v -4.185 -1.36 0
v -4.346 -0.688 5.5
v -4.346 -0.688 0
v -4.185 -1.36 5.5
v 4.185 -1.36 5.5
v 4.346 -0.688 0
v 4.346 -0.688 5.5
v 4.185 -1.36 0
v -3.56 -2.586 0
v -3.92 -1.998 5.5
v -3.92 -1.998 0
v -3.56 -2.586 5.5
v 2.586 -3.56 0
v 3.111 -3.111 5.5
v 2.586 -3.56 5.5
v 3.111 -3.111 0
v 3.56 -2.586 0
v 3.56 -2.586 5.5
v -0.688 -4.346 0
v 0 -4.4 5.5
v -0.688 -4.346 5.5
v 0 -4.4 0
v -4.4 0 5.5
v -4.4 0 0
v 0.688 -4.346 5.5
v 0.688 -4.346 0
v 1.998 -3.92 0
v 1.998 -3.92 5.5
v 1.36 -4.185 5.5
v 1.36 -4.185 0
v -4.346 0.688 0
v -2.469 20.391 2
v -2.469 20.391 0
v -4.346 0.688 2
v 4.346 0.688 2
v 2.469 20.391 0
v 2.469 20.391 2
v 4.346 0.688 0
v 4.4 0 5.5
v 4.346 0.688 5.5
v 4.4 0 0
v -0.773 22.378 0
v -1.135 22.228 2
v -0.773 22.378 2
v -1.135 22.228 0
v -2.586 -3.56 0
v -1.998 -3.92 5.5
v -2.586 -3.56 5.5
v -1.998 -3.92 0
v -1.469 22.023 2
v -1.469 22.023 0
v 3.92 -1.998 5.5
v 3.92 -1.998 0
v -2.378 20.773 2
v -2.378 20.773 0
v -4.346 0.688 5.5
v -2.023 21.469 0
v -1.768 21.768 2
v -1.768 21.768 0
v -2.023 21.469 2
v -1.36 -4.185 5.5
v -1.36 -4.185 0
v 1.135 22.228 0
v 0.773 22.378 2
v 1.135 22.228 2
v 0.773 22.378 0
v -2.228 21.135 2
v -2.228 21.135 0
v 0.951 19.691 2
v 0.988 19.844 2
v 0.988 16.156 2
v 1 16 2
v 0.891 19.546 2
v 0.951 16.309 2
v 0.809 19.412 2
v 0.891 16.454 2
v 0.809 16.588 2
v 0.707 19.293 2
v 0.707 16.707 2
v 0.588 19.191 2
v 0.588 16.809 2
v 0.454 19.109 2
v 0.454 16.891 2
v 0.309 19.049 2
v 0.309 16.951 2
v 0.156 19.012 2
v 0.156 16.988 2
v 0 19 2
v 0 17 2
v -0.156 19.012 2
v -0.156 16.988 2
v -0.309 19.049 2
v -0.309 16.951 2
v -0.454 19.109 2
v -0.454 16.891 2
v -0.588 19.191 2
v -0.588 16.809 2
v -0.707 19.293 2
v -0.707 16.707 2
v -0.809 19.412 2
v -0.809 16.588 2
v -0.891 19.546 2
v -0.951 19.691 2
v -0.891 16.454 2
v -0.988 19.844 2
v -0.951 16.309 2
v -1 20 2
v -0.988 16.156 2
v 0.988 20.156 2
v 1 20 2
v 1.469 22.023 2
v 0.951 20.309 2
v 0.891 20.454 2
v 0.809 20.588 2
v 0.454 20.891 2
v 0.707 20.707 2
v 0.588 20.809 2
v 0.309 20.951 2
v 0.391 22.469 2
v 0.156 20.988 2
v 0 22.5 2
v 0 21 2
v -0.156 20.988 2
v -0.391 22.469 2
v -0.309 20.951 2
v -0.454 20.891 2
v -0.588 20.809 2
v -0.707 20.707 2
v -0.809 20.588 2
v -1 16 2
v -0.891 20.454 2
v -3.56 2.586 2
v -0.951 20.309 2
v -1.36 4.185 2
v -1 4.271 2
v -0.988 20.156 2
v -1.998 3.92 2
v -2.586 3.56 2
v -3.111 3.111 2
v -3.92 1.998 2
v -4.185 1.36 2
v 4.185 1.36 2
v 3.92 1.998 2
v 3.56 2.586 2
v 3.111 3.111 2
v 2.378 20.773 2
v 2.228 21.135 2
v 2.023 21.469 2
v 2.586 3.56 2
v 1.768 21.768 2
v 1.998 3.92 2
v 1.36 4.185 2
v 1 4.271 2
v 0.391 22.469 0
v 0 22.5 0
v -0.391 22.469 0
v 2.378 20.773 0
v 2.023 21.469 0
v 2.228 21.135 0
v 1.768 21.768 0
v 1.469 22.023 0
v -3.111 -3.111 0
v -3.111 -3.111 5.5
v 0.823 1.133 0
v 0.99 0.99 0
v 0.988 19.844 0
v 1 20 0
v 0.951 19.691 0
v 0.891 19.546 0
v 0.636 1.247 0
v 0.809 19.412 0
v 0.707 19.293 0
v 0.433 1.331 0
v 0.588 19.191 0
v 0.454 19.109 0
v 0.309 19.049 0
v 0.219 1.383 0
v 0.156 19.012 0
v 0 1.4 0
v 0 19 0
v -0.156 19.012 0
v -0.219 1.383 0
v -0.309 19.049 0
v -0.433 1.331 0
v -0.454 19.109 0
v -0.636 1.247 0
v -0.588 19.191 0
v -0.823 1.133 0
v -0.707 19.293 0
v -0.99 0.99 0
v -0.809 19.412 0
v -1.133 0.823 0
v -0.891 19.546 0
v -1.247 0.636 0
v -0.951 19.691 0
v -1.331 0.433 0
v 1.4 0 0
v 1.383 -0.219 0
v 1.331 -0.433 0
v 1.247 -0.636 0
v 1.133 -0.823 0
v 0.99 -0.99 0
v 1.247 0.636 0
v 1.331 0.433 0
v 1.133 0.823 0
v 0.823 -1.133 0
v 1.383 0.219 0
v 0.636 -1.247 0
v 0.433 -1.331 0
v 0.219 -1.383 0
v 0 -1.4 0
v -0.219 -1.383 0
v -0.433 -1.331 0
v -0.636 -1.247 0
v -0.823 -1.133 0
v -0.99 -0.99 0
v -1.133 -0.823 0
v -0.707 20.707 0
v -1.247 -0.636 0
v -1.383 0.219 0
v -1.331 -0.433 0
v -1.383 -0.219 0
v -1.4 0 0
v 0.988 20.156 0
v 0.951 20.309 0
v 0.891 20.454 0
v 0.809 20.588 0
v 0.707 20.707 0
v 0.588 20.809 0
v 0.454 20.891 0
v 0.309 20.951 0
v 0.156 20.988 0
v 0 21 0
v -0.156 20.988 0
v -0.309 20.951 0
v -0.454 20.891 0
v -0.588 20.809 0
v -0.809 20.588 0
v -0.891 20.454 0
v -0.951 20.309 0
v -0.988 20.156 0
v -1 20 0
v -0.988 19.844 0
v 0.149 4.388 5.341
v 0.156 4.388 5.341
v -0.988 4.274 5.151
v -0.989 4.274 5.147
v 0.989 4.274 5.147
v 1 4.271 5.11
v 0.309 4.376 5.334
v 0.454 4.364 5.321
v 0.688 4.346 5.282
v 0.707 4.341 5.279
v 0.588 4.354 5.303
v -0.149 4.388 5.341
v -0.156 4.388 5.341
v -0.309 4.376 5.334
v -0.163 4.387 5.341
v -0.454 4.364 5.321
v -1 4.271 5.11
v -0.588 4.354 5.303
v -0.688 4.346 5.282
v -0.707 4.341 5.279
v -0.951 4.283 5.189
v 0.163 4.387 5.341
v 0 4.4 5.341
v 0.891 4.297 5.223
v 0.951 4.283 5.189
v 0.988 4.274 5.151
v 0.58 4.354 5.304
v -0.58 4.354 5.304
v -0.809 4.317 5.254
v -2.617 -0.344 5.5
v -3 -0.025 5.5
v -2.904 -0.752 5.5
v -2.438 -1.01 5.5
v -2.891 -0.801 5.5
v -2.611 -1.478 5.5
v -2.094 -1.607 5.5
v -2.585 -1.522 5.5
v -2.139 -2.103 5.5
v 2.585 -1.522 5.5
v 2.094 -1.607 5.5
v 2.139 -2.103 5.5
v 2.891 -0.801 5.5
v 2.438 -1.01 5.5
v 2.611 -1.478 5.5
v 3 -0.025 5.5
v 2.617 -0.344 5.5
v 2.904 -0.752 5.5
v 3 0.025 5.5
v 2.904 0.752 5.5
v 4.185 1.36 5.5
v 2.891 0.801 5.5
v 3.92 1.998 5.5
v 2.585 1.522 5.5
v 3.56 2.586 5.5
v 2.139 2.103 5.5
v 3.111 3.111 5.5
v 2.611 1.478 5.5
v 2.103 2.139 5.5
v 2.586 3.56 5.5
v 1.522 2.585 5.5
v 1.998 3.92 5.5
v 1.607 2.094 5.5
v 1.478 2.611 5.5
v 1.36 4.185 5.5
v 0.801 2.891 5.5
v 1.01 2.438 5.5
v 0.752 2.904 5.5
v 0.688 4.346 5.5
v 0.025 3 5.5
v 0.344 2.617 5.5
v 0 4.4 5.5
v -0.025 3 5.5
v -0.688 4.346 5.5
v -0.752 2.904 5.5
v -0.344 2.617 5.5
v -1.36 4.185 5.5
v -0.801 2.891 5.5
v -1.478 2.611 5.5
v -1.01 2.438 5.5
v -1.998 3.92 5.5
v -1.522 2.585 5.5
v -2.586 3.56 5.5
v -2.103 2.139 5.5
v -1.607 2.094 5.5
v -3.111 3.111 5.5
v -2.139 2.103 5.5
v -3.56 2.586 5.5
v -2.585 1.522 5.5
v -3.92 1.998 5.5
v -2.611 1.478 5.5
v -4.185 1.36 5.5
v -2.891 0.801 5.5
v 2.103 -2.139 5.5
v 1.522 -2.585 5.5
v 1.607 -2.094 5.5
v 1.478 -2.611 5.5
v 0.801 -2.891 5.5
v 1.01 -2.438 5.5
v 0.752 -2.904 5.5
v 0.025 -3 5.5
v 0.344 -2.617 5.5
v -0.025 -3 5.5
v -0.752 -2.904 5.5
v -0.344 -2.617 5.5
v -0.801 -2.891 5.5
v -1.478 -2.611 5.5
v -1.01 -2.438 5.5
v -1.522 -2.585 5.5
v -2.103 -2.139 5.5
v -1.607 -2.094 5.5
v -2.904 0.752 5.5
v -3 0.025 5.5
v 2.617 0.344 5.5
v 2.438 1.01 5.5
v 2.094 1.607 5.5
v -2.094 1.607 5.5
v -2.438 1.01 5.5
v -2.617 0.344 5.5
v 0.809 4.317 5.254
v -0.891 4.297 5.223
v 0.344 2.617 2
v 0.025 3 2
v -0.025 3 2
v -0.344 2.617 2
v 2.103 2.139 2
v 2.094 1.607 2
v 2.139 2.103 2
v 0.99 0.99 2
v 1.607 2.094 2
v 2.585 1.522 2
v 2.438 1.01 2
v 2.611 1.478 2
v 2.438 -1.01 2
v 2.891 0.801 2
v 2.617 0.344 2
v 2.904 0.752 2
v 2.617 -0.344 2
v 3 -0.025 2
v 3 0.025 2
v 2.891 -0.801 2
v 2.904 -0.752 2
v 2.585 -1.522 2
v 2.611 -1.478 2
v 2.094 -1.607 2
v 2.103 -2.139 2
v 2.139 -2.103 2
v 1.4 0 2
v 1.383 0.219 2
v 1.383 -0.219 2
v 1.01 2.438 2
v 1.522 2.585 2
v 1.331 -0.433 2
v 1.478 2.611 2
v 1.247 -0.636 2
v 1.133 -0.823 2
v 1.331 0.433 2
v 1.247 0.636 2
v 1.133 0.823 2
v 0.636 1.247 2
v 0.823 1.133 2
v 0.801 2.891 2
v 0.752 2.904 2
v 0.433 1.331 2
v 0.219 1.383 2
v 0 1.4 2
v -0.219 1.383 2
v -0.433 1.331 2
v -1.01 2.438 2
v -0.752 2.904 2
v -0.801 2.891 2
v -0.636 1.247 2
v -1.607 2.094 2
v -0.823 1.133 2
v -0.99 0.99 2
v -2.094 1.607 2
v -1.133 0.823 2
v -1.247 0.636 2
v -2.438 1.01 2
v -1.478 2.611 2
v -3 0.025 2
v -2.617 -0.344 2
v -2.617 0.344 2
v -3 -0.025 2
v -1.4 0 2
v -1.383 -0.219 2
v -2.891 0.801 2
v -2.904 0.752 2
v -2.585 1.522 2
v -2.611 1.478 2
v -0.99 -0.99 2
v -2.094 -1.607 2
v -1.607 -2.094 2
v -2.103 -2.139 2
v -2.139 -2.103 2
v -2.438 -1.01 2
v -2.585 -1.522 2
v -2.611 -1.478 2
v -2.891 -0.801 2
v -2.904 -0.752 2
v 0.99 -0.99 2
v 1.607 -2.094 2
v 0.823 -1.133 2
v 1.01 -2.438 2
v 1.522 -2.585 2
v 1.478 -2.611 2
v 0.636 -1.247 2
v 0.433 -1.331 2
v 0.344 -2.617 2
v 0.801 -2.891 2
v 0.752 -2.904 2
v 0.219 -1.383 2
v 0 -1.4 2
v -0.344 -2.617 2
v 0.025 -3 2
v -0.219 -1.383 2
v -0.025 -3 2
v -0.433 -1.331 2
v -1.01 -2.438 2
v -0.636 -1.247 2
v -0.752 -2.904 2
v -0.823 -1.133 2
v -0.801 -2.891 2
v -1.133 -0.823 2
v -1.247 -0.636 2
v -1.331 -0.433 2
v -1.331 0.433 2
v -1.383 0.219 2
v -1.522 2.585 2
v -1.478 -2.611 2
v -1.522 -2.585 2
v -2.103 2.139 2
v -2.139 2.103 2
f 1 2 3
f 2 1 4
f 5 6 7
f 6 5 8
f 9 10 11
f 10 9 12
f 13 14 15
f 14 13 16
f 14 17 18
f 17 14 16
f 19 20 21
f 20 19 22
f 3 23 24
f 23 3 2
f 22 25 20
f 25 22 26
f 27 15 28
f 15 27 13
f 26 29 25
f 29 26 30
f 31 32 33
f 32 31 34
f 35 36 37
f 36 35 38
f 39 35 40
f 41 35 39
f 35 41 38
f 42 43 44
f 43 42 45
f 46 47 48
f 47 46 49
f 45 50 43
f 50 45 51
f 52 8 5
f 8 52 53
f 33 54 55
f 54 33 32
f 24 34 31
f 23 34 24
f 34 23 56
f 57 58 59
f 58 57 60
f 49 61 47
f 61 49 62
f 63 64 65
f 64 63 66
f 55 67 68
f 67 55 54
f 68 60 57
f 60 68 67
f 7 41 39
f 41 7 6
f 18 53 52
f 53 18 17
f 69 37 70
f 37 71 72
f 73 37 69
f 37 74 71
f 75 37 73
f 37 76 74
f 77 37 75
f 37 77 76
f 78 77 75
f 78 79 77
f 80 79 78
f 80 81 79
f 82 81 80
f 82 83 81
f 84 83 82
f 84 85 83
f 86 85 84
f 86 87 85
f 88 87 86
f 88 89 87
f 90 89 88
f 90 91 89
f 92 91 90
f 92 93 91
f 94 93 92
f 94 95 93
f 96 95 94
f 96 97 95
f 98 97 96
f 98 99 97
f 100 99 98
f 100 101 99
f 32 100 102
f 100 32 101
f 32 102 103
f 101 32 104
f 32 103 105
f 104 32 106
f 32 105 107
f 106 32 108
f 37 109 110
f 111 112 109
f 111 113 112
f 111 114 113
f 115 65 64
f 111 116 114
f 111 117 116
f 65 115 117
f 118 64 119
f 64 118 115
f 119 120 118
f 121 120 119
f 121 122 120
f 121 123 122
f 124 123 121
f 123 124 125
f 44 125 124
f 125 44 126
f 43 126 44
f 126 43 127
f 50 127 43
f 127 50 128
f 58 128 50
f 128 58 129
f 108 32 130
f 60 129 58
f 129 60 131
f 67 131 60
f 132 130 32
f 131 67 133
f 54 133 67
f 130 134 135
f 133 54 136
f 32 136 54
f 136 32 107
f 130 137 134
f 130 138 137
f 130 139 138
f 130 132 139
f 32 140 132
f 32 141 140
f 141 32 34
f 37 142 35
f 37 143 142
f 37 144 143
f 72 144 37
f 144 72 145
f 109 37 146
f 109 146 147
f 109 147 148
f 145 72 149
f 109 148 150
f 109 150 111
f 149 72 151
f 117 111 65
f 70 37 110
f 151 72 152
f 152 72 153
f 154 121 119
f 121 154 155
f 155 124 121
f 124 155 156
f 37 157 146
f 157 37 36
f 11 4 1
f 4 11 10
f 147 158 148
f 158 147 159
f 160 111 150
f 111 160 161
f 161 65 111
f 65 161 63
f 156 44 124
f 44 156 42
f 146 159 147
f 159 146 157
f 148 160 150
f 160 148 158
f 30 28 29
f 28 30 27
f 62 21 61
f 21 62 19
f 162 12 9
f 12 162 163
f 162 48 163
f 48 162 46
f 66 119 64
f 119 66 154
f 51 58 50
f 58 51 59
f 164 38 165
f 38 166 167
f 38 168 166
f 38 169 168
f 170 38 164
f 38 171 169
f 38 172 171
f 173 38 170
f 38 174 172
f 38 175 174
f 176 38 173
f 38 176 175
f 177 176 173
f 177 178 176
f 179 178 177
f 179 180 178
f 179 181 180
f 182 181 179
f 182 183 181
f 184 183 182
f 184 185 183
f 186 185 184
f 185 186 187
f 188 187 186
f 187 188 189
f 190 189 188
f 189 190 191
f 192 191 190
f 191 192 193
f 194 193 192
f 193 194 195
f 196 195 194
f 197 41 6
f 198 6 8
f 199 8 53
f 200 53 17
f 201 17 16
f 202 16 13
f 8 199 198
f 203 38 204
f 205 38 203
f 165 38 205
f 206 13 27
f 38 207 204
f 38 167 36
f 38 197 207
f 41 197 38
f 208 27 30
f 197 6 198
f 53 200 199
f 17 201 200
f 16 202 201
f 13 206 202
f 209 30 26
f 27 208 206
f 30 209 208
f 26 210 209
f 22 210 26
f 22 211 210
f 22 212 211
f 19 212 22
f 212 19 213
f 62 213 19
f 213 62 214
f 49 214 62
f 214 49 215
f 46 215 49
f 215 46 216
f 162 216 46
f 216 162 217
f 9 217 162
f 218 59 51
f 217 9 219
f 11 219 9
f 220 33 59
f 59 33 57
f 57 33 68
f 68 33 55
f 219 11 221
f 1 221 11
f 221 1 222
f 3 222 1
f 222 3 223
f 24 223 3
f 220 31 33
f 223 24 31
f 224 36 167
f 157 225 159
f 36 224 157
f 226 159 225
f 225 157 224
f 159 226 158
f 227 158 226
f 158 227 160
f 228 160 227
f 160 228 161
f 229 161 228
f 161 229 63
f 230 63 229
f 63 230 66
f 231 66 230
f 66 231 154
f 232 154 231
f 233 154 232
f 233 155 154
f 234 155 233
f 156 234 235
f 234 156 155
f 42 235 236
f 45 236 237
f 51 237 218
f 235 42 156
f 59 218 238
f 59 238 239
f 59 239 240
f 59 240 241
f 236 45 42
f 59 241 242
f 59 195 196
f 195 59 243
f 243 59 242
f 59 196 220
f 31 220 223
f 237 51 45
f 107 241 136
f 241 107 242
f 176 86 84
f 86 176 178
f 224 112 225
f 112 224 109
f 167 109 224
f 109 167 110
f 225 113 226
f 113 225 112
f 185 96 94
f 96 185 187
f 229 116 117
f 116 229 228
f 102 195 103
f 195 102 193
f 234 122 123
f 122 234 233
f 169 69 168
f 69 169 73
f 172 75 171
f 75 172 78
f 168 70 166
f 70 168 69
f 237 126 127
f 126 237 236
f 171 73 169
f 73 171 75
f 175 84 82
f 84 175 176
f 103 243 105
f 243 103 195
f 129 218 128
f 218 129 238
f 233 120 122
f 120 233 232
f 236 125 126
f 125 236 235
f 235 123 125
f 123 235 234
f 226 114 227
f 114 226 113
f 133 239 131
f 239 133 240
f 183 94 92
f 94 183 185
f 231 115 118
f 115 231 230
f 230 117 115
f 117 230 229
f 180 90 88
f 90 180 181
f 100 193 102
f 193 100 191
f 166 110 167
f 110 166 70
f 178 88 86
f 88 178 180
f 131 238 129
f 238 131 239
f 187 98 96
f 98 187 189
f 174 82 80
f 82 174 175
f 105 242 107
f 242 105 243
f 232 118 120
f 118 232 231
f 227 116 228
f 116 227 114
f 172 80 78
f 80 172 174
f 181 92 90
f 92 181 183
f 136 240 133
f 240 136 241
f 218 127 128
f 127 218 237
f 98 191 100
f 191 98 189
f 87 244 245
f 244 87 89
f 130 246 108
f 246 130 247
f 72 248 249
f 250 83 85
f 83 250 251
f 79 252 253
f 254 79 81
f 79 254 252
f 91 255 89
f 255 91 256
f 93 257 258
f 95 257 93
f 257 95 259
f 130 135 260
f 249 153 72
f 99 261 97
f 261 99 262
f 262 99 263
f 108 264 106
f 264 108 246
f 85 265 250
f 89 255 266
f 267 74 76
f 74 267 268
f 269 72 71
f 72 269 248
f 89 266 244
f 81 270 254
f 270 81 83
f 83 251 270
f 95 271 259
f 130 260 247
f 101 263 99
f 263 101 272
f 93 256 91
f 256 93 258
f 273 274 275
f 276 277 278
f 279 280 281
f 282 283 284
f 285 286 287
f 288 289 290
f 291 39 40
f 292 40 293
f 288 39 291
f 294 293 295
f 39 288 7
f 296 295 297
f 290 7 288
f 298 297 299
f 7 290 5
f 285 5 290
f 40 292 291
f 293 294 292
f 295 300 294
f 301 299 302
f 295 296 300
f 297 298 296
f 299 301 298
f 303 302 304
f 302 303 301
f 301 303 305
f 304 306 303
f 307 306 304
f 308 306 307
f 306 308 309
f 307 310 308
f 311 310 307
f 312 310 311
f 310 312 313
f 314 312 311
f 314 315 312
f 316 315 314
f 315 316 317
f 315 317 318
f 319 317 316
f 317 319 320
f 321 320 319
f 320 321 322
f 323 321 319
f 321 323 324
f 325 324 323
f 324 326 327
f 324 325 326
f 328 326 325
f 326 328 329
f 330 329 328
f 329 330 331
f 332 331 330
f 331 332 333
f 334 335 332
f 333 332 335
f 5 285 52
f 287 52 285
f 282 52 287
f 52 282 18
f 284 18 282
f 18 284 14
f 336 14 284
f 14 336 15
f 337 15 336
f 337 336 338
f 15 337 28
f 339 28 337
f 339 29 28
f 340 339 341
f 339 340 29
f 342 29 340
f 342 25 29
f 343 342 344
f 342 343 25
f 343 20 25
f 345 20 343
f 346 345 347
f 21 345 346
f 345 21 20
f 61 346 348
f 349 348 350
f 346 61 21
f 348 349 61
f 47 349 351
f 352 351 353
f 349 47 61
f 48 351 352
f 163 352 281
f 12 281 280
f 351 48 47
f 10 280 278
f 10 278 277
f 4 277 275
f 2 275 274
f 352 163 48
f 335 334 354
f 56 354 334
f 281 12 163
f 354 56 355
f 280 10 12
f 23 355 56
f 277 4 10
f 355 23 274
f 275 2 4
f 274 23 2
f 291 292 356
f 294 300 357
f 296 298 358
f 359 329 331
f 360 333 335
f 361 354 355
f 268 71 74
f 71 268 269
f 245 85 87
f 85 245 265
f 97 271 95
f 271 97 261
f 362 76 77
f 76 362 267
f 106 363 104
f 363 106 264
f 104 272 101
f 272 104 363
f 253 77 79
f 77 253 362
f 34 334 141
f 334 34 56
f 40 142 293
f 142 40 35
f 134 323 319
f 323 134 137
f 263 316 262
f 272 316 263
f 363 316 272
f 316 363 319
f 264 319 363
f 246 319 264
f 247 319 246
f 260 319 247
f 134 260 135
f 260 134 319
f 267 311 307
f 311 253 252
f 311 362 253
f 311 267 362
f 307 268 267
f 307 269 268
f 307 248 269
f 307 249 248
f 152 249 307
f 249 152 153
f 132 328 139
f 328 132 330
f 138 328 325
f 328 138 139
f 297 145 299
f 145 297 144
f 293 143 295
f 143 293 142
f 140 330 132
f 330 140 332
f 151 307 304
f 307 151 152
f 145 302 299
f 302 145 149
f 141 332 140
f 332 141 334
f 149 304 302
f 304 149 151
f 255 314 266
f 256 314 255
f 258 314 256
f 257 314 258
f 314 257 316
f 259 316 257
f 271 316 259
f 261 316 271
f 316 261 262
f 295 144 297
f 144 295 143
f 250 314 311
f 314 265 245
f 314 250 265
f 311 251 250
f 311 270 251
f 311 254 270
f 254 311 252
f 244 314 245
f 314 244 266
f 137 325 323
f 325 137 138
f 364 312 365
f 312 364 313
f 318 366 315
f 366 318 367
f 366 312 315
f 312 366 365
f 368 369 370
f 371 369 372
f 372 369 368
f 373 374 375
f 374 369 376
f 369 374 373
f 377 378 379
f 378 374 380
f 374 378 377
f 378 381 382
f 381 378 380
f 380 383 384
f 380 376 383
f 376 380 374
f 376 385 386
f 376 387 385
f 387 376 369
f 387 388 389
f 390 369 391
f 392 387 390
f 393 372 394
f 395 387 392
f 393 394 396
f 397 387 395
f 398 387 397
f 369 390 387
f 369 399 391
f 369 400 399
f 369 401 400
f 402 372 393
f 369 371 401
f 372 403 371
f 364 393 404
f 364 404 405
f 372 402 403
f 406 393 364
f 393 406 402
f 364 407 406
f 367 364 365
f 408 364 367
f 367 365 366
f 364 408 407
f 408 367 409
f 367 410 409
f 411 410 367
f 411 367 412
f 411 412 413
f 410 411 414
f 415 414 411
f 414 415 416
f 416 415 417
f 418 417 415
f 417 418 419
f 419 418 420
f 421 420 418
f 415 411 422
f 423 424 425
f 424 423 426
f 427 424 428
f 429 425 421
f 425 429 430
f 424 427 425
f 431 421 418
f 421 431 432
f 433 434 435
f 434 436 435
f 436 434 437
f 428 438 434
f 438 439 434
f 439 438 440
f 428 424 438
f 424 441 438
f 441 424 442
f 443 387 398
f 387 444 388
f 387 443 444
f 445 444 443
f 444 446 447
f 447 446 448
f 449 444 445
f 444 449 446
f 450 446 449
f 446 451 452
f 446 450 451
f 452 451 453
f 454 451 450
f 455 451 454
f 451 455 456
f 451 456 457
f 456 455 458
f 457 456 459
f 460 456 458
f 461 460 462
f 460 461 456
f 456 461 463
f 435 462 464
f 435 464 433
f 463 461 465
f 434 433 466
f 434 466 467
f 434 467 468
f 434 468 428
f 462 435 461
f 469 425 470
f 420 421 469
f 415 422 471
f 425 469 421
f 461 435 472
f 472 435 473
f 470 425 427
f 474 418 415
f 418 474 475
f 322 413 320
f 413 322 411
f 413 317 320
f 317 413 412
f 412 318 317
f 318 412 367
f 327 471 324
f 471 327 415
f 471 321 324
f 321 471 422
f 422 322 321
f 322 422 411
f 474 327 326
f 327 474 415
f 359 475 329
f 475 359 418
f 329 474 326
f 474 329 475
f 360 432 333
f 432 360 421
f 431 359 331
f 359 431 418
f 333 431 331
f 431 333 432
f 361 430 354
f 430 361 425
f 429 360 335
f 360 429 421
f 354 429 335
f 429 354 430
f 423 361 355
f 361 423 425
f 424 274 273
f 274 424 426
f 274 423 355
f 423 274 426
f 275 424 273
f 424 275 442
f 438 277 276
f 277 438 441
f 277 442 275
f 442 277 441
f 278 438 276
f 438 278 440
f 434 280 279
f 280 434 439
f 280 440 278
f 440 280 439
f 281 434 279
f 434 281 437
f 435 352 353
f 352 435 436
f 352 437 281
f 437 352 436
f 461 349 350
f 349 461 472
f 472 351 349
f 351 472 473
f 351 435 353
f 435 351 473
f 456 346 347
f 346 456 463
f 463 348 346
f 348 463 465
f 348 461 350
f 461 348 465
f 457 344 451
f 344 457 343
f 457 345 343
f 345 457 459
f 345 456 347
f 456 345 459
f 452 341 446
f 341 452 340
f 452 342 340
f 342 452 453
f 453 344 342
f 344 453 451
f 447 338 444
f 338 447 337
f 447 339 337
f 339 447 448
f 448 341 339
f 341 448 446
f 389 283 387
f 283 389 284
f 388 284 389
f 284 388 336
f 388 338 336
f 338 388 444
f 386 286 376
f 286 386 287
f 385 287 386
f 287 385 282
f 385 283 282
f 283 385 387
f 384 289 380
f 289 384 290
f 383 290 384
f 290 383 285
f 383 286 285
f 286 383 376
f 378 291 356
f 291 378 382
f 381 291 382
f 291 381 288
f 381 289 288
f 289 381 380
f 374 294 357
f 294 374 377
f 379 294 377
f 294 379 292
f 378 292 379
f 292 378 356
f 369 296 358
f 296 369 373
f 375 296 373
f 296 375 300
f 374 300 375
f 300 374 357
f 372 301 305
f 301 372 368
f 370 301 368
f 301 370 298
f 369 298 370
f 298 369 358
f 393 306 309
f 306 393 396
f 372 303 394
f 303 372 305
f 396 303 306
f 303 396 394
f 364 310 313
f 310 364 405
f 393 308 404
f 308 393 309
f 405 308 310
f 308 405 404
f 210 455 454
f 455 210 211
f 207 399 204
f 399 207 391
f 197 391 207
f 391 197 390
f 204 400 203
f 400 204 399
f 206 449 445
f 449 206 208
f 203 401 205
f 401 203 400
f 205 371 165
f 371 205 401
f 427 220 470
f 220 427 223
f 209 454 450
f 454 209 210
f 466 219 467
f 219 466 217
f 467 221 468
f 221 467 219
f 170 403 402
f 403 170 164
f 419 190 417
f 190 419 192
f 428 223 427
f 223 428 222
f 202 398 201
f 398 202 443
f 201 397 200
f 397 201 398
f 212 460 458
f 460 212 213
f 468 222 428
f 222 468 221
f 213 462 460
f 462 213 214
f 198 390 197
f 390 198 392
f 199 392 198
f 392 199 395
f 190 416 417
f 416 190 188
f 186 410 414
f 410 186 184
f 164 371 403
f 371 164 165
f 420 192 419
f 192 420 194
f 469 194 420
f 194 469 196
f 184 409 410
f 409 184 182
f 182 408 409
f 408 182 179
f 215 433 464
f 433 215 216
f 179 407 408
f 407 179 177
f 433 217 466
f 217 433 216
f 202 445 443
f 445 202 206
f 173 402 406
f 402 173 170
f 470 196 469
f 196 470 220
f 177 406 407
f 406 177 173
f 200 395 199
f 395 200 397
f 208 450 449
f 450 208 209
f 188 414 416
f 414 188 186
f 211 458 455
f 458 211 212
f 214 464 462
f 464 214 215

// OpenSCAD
/**
    Parametric servo arm generator for OpenScad

    Forked from 2012 Charles Rincheval.  All rights reserved.

    This library is free software; you can redistribute it and/or
    modify it under the terms of the GNU Lesser General Public
    License as published by the Free Software Foundation; either
    version 2.1 of the License, or (at your option) any later version.

    This library is distributed in the hope that it will be useful,
    but WITHOUT ANY WARRANTY; without even the implied warranty of
    MERCHANTABILITY or FITNESS FOR A PARTICULAR PURPOSE.  See the GNU
    Lesser General Public License for more details.

    You should have received a copy of the GNU Lesser General Public
    License along with this library; if not, write to the Free Software
    Foundation, Inc., 51 Franklin St, Fifth Floor, Boston, MA  02110-1301  USA

*/

// Which Spline would you like to see?
// spline_type = 1; // [1:"Hitec C1-24T",2:"Hitec D1-15T",3:"Futaba 1F-15",4:"Futaba 2F-21T (9g?)",5:"Futaba 3F-25T]";
// Spline Size
spline_type = 1; // [1:Hitec C1-24T, 2:Hitec D1-15T, 3:Futaba 1F-15, 4:Futaba 2F-21T (9g?), 5:Futaba 3F-25T, 6:Actobotics Horn(Hitec), 7:Actobotics Horn(Futaba), 8:Tetrix Horn(Hitec), 9:Tetrix Horn(Futaba) ]

arm_length = 20;

arm_count = 1; // [1,2,3,4,5,6,7,8]

arm_screw_diameter = 2.0;

base_thickness = 2.0;

/**
    Clear between arm head and servo head
    With PLA material, use clear : 0.3, for ABS, use 0.2
*/
SERVO_HEAD_CLEARANCE = 0.2;


$fn = 40/1;


/**
    Head / Tooth parameters
    http://https://www.servocity.com/servo-spline-info

    First array (head related) :
    0. Head external diameter  (INTERNAL OF TEETH)
    1. Head height
    2. Head thickness
    3. Head screw diameter
    4. Head Base Thickness

    Second array (tooth related) :
    0. Tooth count
    1. Tooth height
    2. Tooth length
    3. Tooth width
*/
/**
   Tooth (ON SERVO)

     |<-w->|
     |_____|___
     /     \  ^h
   _/       \_v
    |<--l-->|

   - tooth height (h)
   - tooth length (l)
   - tooth width (w)

    For a new servo: Seems to work best to first set the tooth height to zero,
     and get the outer diameter snug, then work on the teeth.

   Printed very well on Printrbot Simple Pro  0.3mm nozzle, 0.1 layer PLA

   If you need just the spline, set the arm length, and head base thickness to zero

*/
//------------------------------------------------

HITEC_D1_SPLINE = [
                    [7.6, 5.5, 1.8, 3.4, base_thickness],
                    [15, 0.7, 1.3, 0.2]
                  ];
module servo_hitec_d1(length, count) {
  servo_arm(HITEC_D1_SPLINE, [length, count]);
}
//------------------------------------------------

HITEC_C1_SPLINE = [
                    [5.6, 3.5, 1.6, 2.8, base_thickness],
                    [24, 0.4, 0.7, 0.051]
                  ];
module servo_hitec_c1(length, count) {
  servo_arm(HITEC_C1_SPLINE, [length, count]);
}
//------------------------------------------------

FUTABA_1F_SPLINE = [
                     [4.0, 3.75, 1.1, 2.3, base_thickness],
                     [15, 0.25, 0.6, 0.09]
                   ];
module servo_futaba_1f(length, count) {
    servo_arm(FUTABA_1F_SPLINE, [length, count]);
}
//------------------------------------------------

FUTABA_2F_SPLINE = [
                     [4.90, 3, 1.8, 2.3, base_thickness],
                     [21, 0.57, 0.7, 0.1]
                   ];
module servo_futaba_2f(length, count) {
  servo_arm(FUTABA_2F_SPLINE, [length, count]);
}
//------------------------------------------------

FUTABA_3F_SPLINE = [
                     [5.92, 3, 1.1, 2.5, base_thickness],
                     [25, 0.3, 0.7, 0.1]
                   ];
module servo_futaba_3f(length, count) {
  servo_arm(FUTABA_3F_SPLINE, [length, count]);
}
//------------------------------------------------

/**
    If you want to support a new servo, juste add a new spline definition array
    and a module named like servo_XXX_YYY where XXX is servo brand and YYY is the
    connection type (3f) or the servo type (s3003)
*/

//    Servo head

module servo_head(params, clear = SERVO_HEAD_CLEARANCE) {

  head = params[0];
  tooth = params[1];

  head_diameter = head[0];
  head_height = head[1];
  head_base = head[4];

  tooth_count = tooth[0];
  tooth_height = tooth[1];
  tooth_length = tooth[2];
  tooth_width = tooth[3];

  //     %cylinder(r = (head_diameter / 2), h = head_height + 1);

  cylinder(r = head_diameter / 2 - tooth_height + 0.03 + clear, h = head_height);

// add teeth
    for (i = [0 : tooth_count]) {
      rotate([0, 0, i * (360 / tooth_count)]) {
        translate([0, head_diameter / 2 - tooth_height + clear, 0]) {
          servo_head_tooth(tooth_length, tooth_width, tooth_height, head_height);
        }
      }
    }
  }


module servo_head_tooth(length, width, height, head_height){

  curvatureAdd = 0.05;
  linear_extrude(height = head_height) {
    polygon([[-length / 2 - curvatureAdd, -curvatureAdd], [-width / 2, height], [width / 2, height], [length / 2 + curvatureAdd, -curvatureAdd]]);  
   }
}
/**
    Servo hold
    - Head / Tooth parameters
    - Arms params (length and count)
*/
module servo_arm(params, arms) {

  head = params[0];
  tooth = params[1];

  head_diameter = head[0];
  head_height = head[1];
  head_thickness = head[2];
  head_screw_diameter = head[3];
  head_base = head[4];

  tooth_length = tooth[2];
  tooth_width = tooth[3];

  arm_length = arms[0];
  arm_count = arms[1];

  /**
      Servo arm
      - length is from center to last hole
  */
  module arm(tooth_length, tooth_width, head_height, hole_count ) {

//    arm_screw_diameter = 2;

    difference() {
      union() {
        hull() {
          cylinder(r = tooth_width / 2, h = head_base);
          translate([0, tooth_length, 0]) {
          cylinder(r = arm_screw_diameter / 2 + 1.5, h = head_base);
//          #cylinder(r = tooth_width / 3, h = head_base);
              
          } 
        }

      }

      // Hole
//      for (i = [0 : hole_count - 1]) {
        //translate([0, length - (length / hole_count * i), -1]) {
        translate([0, tooth_length , -1]) {
          cylinder(r = arm_screw_diameter / 2, h = 10);
        }
//      }

      translate([0, 0, -0.001])cylinder(r = head_screw_diameter / 2, h = 10);
    }



  }

  arm_thickness = head_thickness;

  // Arm
  difference() {   // spline hub
    union(){
      for (j = [0 : arm_count - 1]) {
        rotate([0, 0, j * (360 / arm_count)]) {
          arm(arm_length, head_diameter + arm_thickness * 2, head_height, 1);
            hull() {                  // cross support
              translate([0 , head_diameter/2, 0])
              cylinder(r = head_base / 2, h = head_base + head_height);
              translate([0 , max(arm_length - 4,0), 0])
              cylinder(r = head_base / 2, h = head_base);
            } 
         }
       }
        
       cylinder(r = head_diameter / 2 + head_thickness, h = head_height + head_base );
     }
    
     translate([0, 0, -0.001]) 
     cylinder(r = head_screw_diameter / 2, h = 10);  // hole
     translate([0, 0, head_base + 0.0001])
     servo_head(params); // teeth

  }

     if (spline_type >= 6 ){       // servo horns for actobotics,tetrix
         difference(){
              rad=13.5;
              if (spline_type >= 8) {
                  cylinder(r=11.5,h=head_base);}
              else {
                  cylinder(r=13.5,h=head_base);}
                      
                 for (j = [0 : arm_count - 1]) {
                     rotate([0, 0, j * (360 / arm_count)])
                     translate([0, arm_length , -1]) 
                     cylinder(r = 2.05 , h = 10);
//                     cylinder(r = arm_screw_diameter / 2 , h = 10);
                         }
         
         }
         }

 
}


print_part();

module print_part() {
	if (spline_type == 1)  {
		servo_hitec_c1 (arm_length, arm_count);
	} else if (spline_type  == 2) {
		servo_hitec_d1 (arm_length, arm_count);
	} else if (spline_type  == 3)  {
		servo_futaba_1f(arm_length, arm_count);
	} else if (spline_type  == 4) {
		servo_futaba_2f(arm_length, arm_count);
	} else if (spline_type  == 5) {
		servo_futaba_3f(arm_length, arm_count);
	} else if (spline_type  == 6) {
		servo_hitec_c1 (0.770*25.4/2, 8);
	} else if (spline_type  == 7) {
		servo_futaba_3f(0.770*25.4/2, 8);
	} else if (spline_type  == 8) {
		servo_hitec_c1 (16/2, 8);
	} else if (spline_type  == 9) {
		servo_futaba_3f(16/2, 8);
	}
}
/*
translate([00,0,0]) servo_futaba_1f(10, 1);
translate([10,0,0]) servo_futaba_2f(10, 1);
translate([0,-30,0]) servo_futaba_3f(20, 4);
translate([20,0,0]) servo_hitec_c1 (30, 1);
translate([32,0,0]) servo_hitec_d1 (40, 2);
*/
